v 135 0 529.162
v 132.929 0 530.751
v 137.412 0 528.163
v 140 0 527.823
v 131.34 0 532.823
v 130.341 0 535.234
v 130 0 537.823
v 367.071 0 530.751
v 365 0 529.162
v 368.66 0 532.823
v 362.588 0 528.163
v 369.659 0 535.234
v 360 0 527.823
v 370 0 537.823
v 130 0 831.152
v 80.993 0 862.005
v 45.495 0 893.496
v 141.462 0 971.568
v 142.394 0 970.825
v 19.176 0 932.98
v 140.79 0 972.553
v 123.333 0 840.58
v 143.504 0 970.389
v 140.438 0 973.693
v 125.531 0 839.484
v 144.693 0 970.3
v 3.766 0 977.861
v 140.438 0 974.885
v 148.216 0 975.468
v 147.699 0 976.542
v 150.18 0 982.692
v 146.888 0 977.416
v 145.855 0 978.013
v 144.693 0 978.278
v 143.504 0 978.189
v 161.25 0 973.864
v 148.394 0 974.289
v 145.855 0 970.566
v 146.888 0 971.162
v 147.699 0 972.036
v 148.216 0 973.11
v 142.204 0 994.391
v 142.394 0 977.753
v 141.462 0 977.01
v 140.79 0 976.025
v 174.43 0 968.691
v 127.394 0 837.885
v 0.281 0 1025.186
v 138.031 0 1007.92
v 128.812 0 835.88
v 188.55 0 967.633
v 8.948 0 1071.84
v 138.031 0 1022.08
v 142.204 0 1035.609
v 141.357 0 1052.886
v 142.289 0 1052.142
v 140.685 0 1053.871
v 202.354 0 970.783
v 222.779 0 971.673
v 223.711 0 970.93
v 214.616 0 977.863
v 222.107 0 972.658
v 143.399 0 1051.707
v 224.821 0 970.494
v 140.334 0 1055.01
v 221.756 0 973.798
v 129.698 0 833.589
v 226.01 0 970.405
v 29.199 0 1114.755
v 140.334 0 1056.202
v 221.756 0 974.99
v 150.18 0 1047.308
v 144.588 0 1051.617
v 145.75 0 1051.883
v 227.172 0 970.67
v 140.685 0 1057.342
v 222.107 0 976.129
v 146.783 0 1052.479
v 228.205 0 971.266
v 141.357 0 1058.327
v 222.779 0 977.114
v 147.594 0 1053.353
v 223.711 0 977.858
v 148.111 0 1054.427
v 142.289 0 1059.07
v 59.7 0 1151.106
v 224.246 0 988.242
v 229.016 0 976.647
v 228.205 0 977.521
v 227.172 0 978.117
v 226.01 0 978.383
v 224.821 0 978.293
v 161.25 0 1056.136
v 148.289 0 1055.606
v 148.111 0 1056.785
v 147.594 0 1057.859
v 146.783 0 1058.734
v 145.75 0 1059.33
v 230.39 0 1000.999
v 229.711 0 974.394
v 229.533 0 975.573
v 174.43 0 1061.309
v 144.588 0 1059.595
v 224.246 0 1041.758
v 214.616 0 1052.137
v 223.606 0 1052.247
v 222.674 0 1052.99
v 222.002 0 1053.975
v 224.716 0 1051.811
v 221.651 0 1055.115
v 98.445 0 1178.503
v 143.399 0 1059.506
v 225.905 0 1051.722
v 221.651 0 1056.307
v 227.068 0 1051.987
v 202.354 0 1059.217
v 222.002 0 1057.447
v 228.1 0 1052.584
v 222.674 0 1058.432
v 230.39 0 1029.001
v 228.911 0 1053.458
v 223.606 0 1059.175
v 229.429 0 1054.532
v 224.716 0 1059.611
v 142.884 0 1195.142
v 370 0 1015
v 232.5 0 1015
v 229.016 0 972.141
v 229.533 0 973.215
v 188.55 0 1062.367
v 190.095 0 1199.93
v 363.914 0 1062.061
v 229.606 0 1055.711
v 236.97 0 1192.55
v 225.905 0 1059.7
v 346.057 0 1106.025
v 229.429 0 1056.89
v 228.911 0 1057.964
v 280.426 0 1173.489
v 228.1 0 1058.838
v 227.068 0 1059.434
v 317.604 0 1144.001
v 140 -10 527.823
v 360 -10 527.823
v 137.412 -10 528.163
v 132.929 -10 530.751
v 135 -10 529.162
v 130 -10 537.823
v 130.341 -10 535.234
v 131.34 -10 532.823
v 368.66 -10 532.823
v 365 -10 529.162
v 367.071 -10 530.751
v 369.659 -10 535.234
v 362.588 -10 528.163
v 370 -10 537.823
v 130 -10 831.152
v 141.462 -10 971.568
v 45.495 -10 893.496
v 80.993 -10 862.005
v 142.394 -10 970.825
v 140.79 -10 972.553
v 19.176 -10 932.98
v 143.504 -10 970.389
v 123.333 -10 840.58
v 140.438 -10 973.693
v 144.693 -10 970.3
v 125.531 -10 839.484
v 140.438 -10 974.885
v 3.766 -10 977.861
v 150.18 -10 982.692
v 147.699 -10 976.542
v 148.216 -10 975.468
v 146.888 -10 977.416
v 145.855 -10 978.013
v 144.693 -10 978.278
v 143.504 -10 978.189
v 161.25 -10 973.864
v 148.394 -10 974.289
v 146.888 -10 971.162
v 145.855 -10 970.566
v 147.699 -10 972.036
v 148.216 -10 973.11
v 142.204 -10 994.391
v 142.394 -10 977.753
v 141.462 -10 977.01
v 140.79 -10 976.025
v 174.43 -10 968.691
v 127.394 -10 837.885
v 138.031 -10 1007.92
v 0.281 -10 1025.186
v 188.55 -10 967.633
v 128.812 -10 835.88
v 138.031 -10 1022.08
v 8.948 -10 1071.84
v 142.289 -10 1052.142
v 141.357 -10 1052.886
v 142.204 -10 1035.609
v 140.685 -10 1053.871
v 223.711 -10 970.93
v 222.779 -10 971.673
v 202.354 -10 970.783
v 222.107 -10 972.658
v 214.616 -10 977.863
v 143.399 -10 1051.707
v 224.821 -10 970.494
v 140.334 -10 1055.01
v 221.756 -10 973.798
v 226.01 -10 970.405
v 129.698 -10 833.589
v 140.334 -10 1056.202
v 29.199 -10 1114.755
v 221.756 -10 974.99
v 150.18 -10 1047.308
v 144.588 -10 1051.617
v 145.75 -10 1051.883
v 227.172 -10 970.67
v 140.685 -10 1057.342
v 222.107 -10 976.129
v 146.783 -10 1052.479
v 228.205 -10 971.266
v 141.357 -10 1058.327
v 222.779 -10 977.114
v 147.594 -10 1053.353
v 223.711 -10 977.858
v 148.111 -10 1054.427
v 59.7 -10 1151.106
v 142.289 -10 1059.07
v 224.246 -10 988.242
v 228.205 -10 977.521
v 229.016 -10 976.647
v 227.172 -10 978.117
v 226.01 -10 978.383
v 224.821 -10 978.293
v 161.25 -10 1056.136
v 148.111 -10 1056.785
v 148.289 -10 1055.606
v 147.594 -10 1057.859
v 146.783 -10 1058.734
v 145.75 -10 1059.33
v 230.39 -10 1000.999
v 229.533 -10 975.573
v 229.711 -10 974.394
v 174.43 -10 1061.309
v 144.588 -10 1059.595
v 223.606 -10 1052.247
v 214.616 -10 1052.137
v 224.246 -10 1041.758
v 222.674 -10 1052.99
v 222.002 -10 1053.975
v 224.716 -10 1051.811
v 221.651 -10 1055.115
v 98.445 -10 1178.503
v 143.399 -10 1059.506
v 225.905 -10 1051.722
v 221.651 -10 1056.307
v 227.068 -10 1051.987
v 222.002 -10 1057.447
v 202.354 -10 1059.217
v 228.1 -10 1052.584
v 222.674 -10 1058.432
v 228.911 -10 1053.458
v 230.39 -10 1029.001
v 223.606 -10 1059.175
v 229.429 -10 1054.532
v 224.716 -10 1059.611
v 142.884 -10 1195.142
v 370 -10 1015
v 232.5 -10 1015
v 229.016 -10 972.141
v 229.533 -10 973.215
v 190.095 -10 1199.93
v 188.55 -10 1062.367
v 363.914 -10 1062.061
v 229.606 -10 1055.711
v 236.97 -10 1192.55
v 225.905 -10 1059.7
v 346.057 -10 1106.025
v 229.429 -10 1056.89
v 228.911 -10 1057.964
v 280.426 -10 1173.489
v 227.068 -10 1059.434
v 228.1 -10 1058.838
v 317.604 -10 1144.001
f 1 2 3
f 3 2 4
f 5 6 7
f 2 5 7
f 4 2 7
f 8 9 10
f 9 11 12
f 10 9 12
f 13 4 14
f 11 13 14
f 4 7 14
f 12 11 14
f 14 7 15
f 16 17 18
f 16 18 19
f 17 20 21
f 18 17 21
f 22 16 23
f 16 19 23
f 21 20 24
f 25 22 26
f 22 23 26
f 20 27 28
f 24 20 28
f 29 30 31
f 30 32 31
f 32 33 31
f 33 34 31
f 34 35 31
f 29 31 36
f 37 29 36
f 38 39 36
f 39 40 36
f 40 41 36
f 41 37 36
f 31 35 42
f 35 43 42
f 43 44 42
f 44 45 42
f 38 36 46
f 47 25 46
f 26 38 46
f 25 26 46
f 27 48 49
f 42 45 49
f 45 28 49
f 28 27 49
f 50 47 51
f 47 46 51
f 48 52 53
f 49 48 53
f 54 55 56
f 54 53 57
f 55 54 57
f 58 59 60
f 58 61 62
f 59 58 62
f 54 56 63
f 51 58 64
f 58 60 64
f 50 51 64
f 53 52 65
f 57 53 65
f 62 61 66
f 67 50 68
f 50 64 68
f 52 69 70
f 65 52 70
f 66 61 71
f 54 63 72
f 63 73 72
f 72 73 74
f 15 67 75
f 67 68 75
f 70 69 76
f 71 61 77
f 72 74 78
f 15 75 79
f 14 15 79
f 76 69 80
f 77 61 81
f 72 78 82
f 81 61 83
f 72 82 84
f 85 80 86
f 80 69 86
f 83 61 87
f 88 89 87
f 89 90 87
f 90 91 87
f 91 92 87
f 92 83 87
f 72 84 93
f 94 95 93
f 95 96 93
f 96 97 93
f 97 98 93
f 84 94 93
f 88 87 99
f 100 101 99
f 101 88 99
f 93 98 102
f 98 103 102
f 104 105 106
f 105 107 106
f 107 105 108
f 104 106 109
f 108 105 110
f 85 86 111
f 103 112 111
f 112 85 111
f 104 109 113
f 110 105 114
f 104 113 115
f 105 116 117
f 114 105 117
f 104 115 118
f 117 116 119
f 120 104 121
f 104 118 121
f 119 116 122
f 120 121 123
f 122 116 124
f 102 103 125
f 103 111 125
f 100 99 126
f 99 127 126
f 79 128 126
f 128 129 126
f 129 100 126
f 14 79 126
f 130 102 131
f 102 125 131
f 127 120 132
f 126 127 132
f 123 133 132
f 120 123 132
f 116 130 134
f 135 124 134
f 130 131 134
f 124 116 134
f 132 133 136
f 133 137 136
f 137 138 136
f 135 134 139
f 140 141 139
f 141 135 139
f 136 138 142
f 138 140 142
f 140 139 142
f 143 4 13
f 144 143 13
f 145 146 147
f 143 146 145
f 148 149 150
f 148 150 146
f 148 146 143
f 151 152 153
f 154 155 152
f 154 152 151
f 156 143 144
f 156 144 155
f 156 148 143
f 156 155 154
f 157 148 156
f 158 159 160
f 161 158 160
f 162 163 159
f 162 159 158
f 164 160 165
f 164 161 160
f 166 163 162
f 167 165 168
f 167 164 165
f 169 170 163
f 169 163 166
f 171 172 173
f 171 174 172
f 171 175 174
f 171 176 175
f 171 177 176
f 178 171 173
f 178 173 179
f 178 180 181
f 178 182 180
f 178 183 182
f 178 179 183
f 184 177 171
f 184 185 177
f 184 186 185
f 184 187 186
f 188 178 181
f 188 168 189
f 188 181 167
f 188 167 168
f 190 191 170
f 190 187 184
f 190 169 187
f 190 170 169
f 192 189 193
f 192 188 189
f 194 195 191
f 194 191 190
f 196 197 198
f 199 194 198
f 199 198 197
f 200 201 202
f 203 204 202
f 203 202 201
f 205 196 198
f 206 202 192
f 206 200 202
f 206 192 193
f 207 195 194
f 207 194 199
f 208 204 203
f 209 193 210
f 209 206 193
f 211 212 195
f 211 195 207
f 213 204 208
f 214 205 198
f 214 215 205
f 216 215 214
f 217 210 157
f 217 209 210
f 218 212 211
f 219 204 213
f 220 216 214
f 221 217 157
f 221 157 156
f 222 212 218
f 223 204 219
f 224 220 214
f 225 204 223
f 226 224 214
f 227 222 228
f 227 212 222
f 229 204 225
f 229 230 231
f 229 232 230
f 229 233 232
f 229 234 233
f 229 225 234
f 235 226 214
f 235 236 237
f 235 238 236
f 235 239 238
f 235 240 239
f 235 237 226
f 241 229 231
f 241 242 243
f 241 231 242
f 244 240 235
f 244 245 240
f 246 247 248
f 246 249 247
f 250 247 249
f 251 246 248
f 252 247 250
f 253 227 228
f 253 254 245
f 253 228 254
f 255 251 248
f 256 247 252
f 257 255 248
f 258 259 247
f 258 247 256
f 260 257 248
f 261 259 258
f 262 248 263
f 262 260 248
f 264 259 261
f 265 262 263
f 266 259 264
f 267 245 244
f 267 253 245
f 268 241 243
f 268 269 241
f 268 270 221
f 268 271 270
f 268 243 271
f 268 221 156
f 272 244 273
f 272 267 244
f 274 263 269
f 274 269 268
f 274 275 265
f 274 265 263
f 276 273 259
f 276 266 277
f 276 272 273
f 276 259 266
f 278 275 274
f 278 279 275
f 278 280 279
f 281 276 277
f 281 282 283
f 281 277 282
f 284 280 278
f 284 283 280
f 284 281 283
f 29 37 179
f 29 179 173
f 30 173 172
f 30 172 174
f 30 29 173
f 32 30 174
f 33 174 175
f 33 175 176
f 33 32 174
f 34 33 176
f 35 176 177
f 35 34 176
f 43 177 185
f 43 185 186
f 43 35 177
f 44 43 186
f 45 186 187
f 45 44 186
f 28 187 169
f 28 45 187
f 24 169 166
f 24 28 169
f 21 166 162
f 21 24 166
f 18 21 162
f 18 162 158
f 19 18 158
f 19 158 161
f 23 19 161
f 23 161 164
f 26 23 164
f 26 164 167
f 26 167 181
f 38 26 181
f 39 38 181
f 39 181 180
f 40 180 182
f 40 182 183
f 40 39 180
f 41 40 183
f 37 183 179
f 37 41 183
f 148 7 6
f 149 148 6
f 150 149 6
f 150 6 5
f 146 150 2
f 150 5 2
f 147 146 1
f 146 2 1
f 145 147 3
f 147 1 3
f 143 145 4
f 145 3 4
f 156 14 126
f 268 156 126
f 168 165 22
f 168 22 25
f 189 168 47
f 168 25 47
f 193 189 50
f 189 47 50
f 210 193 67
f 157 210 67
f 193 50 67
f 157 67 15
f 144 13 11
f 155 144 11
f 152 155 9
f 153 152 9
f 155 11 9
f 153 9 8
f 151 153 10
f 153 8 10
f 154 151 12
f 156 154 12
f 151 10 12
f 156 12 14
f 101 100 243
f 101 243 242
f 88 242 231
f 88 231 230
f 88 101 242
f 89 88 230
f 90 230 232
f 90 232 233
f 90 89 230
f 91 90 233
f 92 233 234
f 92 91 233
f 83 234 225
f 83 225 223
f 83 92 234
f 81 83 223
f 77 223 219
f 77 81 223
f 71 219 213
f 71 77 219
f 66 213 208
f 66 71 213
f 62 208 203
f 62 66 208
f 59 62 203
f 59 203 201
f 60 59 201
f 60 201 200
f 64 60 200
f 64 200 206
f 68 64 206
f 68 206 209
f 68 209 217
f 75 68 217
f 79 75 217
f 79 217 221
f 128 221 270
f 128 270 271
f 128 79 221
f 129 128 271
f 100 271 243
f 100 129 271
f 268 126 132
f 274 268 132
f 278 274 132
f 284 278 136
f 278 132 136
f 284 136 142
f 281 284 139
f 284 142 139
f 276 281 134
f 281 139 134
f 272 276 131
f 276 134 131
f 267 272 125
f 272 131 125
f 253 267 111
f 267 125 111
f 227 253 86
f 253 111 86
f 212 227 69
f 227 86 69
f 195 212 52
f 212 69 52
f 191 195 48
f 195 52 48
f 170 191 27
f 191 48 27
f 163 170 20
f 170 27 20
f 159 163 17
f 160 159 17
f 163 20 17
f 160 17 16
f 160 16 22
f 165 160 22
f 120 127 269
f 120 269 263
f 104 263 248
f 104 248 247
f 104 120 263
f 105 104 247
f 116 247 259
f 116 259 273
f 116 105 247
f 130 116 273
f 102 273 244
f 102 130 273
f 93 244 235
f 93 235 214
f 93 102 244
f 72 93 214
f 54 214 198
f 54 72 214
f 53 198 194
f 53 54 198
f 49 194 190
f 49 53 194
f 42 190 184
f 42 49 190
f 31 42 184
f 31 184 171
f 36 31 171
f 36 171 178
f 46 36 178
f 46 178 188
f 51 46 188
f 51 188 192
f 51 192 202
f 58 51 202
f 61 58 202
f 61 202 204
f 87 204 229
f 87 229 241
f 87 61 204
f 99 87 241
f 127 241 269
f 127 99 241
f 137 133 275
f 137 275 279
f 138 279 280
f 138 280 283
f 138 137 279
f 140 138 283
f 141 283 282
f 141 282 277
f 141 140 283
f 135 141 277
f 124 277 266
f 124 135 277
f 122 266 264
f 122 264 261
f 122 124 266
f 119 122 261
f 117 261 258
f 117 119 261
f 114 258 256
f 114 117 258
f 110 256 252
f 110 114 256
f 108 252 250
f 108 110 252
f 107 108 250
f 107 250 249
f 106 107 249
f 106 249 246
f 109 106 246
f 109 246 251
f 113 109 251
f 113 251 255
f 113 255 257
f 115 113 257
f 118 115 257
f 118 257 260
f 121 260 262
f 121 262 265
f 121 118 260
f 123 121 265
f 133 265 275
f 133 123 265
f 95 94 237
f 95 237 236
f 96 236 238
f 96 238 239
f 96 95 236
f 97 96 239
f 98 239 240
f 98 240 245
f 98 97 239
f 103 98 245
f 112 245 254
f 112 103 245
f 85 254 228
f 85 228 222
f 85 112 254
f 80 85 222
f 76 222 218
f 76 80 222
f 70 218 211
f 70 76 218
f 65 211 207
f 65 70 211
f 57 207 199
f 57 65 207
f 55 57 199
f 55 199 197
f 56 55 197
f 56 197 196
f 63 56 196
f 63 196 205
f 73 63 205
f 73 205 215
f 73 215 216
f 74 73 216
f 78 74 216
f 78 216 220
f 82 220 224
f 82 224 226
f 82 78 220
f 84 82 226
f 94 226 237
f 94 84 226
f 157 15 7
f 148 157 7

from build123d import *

# Parameters (mm, degrees)
F0_R     = 4
F0_R_2   = 47.5
F1_DEPTH = 10


with BuildPart() as f1:
    # F0 (on Front) → F1 (new body)
    with BuildSketch(Plane.XZ):
        with BuildLine():
            Line((370, 537.822554), (370, 1015))
            ThreePointArc((370, 1015), (78.1902, 1166.051867), (123.333333, 840.580327))
            ThreePointArc((123.333333, 840.580327), (128.164966, 836.92574), (130, 831.152237))
            Line((130, 831.152237), (130, 537.822554))
            ThreePointArc((130, 537.822554), (132.928932, 530.751486), (140, 527.822554))
            Line((140, 527.822554), (360, 527.822554))
            ThreePointArc((360, 527.822554), (367.071068, 530.751486), (370, 537.822554))
        make_face()
        with Locations((144.393782, 974.289006)):
            Circle(F0_R, mode=Mode.SUBTRACT)
        with Locations((144.289006, 1055.606218)):
            Circle(F0_R, mode=Mode.SUBTRACT)
        with Locations((225.710994, 974.393782)):
            Circle(F0_R, mode=Mode.SUBTRACT)
        with Locations((185, 1015)):
            Circle(F0_R_2, mode=Mode.SUBTRACT)
        with Locations((225.606218, 1055.710994)):
            Circle(F0_R, mode=Mode.SUBTRACT)
    extrude(amount=F1_DEPTH)


solid = f1.part
